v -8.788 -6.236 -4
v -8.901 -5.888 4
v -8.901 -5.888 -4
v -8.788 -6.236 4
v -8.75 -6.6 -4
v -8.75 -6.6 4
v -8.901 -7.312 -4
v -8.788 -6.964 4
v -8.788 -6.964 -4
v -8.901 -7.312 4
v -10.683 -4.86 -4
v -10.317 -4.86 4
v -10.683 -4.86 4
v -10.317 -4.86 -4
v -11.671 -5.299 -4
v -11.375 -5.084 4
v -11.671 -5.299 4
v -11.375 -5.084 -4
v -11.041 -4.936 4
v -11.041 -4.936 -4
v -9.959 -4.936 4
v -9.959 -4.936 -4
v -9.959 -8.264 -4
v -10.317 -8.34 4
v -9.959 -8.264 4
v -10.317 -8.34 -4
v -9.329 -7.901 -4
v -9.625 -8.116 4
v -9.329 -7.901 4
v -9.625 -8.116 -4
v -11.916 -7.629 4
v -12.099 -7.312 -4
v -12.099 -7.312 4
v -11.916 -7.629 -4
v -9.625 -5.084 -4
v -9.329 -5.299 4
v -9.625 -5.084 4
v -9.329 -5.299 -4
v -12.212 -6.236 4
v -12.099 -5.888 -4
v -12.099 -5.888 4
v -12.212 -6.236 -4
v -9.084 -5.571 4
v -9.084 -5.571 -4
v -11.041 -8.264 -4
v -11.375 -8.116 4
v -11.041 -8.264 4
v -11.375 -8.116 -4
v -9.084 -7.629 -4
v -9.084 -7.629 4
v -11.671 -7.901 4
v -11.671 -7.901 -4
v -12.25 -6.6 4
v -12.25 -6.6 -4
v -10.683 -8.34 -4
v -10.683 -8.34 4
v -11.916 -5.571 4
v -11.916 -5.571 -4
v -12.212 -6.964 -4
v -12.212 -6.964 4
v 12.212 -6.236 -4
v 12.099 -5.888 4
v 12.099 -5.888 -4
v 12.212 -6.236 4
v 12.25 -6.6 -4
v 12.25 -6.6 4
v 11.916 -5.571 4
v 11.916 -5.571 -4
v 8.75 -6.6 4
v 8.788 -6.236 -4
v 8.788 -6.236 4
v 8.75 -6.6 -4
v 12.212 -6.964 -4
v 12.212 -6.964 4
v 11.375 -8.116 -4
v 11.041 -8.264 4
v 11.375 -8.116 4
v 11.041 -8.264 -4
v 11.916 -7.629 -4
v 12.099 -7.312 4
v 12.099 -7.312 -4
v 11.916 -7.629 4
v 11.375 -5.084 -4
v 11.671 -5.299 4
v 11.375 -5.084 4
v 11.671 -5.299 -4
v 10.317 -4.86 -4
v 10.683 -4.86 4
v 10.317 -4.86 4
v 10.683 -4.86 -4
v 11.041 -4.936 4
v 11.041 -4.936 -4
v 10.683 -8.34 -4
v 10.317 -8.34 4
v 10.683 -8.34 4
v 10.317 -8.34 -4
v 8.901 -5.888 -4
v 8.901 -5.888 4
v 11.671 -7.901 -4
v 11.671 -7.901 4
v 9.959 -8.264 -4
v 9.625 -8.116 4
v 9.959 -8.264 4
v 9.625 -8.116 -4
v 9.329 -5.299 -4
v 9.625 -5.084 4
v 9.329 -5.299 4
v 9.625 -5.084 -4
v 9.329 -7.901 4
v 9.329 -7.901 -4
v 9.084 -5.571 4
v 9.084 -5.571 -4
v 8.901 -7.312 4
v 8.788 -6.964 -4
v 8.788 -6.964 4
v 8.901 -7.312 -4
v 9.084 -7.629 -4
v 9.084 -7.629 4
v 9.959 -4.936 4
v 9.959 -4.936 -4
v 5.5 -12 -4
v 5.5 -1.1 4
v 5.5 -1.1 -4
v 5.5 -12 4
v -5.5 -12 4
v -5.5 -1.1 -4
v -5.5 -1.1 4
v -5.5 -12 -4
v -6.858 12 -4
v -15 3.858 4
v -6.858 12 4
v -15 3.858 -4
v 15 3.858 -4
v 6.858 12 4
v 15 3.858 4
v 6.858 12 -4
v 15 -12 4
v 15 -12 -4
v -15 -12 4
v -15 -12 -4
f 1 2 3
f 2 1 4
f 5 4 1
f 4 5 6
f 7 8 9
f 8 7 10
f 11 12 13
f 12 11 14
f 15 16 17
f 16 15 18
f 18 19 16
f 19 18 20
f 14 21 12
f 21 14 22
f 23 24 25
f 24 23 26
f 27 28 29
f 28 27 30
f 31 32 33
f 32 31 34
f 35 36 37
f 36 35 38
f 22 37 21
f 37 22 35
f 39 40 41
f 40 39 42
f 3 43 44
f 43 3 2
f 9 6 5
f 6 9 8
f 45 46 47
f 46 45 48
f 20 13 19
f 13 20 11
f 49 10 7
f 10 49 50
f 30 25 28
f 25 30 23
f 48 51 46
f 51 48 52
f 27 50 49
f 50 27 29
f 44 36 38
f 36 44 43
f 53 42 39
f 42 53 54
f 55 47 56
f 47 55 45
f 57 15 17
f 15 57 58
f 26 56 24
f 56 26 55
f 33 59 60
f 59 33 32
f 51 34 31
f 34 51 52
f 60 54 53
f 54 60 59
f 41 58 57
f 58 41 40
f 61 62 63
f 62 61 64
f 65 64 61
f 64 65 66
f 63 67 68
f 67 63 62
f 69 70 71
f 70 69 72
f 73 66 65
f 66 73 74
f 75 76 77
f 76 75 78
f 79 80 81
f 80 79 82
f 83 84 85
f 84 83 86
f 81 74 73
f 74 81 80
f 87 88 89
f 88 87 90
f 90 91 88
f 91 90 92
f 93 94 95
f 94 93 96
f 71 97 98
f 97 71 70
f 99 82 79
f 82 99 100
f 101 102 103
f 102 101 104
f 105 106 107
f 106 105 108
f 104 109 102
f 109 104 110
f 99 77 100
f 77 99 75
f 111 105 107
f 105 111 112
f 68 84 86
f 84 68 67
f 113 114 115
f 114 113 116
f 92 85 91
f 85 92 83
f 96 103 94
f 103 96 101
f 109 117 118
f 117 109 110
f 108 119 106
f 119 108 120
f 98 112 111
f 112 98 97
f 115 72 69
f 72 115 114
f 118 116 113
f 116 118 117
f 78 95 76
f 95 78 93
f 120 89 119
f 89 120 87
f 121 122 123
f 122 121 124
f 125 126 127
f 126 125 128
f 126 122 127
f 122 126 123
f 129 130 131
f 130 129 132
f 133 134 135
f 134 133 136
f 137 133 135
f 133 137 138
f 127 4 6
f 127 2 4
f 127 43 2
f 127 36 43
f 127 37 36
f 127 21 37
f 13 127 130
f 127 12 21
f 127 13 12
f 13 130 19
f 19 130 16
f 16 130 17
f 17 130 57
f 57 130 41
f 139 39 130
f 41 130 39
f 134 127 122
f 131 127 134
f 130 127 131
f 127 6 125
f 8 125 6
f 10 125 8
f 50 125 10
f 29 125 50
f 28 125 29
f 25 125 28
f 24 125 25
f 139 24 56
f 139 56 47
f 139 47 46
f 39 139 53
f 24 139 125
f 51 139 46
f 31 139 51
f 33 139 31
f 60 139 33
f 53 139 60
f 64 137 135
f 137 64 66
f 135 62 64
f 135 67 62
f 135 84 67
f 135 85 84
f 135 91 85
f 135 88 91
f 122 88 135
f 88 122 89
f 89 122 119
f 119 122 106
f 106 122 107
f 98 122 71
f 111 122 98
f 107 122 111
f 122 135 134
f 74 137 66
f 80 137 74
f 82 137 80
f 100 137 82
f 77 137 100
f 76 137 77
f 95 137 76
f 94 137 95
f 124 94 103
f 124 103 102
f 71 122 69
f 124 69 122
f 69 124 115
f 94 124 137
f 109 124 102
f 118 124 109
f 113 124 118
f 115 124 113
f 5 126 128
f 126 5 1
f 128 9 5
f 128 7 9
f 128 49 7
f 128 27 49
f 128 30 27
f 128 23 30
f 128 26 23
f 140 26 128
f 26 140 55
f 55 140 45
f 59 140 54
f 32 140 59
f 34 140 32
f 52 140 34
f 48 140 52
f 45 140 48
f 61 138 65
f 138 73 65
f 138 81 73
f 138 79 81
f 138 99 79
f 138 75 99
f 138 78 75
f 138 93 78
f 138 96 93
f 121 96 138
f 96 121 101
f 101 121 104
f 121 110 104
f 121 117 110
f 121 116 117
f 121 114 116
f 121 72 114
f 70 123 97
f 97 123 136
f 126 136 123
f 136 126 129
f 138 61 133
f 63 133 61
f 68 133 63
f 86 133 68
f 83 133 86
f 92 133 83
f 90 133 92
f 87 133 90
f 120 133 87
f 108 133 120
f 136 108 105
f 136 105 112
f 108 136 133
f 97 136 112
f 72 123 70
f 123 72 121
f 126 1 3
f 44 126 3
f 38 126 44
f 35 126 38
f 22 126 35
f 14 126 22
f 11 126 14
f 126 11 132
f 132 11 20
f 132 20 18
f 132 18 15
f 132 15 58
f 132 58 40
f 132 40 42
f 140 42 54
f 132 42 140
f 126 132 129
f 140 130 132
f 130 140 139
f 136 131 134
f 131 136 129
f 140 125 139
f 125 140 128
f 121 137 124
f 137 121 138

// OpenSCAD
/**
 * leg pad
 */

difference(){
cube(size=[30,24,8],center=true);

translate([0,-6.6,0]){
translate([0,0,0]) cube(size=[11,11,9],center=true);
for(i=[-1,1]) translate([21/2*i,0,0]) cylinder(h = 9, r = 3.5/2, $fn=30, center=true);
}

for(i=[-1,1]) translate([21*i,12,0]) rotate([0,0,i*45]) cube(size=[20,20,9],center=true);

}
